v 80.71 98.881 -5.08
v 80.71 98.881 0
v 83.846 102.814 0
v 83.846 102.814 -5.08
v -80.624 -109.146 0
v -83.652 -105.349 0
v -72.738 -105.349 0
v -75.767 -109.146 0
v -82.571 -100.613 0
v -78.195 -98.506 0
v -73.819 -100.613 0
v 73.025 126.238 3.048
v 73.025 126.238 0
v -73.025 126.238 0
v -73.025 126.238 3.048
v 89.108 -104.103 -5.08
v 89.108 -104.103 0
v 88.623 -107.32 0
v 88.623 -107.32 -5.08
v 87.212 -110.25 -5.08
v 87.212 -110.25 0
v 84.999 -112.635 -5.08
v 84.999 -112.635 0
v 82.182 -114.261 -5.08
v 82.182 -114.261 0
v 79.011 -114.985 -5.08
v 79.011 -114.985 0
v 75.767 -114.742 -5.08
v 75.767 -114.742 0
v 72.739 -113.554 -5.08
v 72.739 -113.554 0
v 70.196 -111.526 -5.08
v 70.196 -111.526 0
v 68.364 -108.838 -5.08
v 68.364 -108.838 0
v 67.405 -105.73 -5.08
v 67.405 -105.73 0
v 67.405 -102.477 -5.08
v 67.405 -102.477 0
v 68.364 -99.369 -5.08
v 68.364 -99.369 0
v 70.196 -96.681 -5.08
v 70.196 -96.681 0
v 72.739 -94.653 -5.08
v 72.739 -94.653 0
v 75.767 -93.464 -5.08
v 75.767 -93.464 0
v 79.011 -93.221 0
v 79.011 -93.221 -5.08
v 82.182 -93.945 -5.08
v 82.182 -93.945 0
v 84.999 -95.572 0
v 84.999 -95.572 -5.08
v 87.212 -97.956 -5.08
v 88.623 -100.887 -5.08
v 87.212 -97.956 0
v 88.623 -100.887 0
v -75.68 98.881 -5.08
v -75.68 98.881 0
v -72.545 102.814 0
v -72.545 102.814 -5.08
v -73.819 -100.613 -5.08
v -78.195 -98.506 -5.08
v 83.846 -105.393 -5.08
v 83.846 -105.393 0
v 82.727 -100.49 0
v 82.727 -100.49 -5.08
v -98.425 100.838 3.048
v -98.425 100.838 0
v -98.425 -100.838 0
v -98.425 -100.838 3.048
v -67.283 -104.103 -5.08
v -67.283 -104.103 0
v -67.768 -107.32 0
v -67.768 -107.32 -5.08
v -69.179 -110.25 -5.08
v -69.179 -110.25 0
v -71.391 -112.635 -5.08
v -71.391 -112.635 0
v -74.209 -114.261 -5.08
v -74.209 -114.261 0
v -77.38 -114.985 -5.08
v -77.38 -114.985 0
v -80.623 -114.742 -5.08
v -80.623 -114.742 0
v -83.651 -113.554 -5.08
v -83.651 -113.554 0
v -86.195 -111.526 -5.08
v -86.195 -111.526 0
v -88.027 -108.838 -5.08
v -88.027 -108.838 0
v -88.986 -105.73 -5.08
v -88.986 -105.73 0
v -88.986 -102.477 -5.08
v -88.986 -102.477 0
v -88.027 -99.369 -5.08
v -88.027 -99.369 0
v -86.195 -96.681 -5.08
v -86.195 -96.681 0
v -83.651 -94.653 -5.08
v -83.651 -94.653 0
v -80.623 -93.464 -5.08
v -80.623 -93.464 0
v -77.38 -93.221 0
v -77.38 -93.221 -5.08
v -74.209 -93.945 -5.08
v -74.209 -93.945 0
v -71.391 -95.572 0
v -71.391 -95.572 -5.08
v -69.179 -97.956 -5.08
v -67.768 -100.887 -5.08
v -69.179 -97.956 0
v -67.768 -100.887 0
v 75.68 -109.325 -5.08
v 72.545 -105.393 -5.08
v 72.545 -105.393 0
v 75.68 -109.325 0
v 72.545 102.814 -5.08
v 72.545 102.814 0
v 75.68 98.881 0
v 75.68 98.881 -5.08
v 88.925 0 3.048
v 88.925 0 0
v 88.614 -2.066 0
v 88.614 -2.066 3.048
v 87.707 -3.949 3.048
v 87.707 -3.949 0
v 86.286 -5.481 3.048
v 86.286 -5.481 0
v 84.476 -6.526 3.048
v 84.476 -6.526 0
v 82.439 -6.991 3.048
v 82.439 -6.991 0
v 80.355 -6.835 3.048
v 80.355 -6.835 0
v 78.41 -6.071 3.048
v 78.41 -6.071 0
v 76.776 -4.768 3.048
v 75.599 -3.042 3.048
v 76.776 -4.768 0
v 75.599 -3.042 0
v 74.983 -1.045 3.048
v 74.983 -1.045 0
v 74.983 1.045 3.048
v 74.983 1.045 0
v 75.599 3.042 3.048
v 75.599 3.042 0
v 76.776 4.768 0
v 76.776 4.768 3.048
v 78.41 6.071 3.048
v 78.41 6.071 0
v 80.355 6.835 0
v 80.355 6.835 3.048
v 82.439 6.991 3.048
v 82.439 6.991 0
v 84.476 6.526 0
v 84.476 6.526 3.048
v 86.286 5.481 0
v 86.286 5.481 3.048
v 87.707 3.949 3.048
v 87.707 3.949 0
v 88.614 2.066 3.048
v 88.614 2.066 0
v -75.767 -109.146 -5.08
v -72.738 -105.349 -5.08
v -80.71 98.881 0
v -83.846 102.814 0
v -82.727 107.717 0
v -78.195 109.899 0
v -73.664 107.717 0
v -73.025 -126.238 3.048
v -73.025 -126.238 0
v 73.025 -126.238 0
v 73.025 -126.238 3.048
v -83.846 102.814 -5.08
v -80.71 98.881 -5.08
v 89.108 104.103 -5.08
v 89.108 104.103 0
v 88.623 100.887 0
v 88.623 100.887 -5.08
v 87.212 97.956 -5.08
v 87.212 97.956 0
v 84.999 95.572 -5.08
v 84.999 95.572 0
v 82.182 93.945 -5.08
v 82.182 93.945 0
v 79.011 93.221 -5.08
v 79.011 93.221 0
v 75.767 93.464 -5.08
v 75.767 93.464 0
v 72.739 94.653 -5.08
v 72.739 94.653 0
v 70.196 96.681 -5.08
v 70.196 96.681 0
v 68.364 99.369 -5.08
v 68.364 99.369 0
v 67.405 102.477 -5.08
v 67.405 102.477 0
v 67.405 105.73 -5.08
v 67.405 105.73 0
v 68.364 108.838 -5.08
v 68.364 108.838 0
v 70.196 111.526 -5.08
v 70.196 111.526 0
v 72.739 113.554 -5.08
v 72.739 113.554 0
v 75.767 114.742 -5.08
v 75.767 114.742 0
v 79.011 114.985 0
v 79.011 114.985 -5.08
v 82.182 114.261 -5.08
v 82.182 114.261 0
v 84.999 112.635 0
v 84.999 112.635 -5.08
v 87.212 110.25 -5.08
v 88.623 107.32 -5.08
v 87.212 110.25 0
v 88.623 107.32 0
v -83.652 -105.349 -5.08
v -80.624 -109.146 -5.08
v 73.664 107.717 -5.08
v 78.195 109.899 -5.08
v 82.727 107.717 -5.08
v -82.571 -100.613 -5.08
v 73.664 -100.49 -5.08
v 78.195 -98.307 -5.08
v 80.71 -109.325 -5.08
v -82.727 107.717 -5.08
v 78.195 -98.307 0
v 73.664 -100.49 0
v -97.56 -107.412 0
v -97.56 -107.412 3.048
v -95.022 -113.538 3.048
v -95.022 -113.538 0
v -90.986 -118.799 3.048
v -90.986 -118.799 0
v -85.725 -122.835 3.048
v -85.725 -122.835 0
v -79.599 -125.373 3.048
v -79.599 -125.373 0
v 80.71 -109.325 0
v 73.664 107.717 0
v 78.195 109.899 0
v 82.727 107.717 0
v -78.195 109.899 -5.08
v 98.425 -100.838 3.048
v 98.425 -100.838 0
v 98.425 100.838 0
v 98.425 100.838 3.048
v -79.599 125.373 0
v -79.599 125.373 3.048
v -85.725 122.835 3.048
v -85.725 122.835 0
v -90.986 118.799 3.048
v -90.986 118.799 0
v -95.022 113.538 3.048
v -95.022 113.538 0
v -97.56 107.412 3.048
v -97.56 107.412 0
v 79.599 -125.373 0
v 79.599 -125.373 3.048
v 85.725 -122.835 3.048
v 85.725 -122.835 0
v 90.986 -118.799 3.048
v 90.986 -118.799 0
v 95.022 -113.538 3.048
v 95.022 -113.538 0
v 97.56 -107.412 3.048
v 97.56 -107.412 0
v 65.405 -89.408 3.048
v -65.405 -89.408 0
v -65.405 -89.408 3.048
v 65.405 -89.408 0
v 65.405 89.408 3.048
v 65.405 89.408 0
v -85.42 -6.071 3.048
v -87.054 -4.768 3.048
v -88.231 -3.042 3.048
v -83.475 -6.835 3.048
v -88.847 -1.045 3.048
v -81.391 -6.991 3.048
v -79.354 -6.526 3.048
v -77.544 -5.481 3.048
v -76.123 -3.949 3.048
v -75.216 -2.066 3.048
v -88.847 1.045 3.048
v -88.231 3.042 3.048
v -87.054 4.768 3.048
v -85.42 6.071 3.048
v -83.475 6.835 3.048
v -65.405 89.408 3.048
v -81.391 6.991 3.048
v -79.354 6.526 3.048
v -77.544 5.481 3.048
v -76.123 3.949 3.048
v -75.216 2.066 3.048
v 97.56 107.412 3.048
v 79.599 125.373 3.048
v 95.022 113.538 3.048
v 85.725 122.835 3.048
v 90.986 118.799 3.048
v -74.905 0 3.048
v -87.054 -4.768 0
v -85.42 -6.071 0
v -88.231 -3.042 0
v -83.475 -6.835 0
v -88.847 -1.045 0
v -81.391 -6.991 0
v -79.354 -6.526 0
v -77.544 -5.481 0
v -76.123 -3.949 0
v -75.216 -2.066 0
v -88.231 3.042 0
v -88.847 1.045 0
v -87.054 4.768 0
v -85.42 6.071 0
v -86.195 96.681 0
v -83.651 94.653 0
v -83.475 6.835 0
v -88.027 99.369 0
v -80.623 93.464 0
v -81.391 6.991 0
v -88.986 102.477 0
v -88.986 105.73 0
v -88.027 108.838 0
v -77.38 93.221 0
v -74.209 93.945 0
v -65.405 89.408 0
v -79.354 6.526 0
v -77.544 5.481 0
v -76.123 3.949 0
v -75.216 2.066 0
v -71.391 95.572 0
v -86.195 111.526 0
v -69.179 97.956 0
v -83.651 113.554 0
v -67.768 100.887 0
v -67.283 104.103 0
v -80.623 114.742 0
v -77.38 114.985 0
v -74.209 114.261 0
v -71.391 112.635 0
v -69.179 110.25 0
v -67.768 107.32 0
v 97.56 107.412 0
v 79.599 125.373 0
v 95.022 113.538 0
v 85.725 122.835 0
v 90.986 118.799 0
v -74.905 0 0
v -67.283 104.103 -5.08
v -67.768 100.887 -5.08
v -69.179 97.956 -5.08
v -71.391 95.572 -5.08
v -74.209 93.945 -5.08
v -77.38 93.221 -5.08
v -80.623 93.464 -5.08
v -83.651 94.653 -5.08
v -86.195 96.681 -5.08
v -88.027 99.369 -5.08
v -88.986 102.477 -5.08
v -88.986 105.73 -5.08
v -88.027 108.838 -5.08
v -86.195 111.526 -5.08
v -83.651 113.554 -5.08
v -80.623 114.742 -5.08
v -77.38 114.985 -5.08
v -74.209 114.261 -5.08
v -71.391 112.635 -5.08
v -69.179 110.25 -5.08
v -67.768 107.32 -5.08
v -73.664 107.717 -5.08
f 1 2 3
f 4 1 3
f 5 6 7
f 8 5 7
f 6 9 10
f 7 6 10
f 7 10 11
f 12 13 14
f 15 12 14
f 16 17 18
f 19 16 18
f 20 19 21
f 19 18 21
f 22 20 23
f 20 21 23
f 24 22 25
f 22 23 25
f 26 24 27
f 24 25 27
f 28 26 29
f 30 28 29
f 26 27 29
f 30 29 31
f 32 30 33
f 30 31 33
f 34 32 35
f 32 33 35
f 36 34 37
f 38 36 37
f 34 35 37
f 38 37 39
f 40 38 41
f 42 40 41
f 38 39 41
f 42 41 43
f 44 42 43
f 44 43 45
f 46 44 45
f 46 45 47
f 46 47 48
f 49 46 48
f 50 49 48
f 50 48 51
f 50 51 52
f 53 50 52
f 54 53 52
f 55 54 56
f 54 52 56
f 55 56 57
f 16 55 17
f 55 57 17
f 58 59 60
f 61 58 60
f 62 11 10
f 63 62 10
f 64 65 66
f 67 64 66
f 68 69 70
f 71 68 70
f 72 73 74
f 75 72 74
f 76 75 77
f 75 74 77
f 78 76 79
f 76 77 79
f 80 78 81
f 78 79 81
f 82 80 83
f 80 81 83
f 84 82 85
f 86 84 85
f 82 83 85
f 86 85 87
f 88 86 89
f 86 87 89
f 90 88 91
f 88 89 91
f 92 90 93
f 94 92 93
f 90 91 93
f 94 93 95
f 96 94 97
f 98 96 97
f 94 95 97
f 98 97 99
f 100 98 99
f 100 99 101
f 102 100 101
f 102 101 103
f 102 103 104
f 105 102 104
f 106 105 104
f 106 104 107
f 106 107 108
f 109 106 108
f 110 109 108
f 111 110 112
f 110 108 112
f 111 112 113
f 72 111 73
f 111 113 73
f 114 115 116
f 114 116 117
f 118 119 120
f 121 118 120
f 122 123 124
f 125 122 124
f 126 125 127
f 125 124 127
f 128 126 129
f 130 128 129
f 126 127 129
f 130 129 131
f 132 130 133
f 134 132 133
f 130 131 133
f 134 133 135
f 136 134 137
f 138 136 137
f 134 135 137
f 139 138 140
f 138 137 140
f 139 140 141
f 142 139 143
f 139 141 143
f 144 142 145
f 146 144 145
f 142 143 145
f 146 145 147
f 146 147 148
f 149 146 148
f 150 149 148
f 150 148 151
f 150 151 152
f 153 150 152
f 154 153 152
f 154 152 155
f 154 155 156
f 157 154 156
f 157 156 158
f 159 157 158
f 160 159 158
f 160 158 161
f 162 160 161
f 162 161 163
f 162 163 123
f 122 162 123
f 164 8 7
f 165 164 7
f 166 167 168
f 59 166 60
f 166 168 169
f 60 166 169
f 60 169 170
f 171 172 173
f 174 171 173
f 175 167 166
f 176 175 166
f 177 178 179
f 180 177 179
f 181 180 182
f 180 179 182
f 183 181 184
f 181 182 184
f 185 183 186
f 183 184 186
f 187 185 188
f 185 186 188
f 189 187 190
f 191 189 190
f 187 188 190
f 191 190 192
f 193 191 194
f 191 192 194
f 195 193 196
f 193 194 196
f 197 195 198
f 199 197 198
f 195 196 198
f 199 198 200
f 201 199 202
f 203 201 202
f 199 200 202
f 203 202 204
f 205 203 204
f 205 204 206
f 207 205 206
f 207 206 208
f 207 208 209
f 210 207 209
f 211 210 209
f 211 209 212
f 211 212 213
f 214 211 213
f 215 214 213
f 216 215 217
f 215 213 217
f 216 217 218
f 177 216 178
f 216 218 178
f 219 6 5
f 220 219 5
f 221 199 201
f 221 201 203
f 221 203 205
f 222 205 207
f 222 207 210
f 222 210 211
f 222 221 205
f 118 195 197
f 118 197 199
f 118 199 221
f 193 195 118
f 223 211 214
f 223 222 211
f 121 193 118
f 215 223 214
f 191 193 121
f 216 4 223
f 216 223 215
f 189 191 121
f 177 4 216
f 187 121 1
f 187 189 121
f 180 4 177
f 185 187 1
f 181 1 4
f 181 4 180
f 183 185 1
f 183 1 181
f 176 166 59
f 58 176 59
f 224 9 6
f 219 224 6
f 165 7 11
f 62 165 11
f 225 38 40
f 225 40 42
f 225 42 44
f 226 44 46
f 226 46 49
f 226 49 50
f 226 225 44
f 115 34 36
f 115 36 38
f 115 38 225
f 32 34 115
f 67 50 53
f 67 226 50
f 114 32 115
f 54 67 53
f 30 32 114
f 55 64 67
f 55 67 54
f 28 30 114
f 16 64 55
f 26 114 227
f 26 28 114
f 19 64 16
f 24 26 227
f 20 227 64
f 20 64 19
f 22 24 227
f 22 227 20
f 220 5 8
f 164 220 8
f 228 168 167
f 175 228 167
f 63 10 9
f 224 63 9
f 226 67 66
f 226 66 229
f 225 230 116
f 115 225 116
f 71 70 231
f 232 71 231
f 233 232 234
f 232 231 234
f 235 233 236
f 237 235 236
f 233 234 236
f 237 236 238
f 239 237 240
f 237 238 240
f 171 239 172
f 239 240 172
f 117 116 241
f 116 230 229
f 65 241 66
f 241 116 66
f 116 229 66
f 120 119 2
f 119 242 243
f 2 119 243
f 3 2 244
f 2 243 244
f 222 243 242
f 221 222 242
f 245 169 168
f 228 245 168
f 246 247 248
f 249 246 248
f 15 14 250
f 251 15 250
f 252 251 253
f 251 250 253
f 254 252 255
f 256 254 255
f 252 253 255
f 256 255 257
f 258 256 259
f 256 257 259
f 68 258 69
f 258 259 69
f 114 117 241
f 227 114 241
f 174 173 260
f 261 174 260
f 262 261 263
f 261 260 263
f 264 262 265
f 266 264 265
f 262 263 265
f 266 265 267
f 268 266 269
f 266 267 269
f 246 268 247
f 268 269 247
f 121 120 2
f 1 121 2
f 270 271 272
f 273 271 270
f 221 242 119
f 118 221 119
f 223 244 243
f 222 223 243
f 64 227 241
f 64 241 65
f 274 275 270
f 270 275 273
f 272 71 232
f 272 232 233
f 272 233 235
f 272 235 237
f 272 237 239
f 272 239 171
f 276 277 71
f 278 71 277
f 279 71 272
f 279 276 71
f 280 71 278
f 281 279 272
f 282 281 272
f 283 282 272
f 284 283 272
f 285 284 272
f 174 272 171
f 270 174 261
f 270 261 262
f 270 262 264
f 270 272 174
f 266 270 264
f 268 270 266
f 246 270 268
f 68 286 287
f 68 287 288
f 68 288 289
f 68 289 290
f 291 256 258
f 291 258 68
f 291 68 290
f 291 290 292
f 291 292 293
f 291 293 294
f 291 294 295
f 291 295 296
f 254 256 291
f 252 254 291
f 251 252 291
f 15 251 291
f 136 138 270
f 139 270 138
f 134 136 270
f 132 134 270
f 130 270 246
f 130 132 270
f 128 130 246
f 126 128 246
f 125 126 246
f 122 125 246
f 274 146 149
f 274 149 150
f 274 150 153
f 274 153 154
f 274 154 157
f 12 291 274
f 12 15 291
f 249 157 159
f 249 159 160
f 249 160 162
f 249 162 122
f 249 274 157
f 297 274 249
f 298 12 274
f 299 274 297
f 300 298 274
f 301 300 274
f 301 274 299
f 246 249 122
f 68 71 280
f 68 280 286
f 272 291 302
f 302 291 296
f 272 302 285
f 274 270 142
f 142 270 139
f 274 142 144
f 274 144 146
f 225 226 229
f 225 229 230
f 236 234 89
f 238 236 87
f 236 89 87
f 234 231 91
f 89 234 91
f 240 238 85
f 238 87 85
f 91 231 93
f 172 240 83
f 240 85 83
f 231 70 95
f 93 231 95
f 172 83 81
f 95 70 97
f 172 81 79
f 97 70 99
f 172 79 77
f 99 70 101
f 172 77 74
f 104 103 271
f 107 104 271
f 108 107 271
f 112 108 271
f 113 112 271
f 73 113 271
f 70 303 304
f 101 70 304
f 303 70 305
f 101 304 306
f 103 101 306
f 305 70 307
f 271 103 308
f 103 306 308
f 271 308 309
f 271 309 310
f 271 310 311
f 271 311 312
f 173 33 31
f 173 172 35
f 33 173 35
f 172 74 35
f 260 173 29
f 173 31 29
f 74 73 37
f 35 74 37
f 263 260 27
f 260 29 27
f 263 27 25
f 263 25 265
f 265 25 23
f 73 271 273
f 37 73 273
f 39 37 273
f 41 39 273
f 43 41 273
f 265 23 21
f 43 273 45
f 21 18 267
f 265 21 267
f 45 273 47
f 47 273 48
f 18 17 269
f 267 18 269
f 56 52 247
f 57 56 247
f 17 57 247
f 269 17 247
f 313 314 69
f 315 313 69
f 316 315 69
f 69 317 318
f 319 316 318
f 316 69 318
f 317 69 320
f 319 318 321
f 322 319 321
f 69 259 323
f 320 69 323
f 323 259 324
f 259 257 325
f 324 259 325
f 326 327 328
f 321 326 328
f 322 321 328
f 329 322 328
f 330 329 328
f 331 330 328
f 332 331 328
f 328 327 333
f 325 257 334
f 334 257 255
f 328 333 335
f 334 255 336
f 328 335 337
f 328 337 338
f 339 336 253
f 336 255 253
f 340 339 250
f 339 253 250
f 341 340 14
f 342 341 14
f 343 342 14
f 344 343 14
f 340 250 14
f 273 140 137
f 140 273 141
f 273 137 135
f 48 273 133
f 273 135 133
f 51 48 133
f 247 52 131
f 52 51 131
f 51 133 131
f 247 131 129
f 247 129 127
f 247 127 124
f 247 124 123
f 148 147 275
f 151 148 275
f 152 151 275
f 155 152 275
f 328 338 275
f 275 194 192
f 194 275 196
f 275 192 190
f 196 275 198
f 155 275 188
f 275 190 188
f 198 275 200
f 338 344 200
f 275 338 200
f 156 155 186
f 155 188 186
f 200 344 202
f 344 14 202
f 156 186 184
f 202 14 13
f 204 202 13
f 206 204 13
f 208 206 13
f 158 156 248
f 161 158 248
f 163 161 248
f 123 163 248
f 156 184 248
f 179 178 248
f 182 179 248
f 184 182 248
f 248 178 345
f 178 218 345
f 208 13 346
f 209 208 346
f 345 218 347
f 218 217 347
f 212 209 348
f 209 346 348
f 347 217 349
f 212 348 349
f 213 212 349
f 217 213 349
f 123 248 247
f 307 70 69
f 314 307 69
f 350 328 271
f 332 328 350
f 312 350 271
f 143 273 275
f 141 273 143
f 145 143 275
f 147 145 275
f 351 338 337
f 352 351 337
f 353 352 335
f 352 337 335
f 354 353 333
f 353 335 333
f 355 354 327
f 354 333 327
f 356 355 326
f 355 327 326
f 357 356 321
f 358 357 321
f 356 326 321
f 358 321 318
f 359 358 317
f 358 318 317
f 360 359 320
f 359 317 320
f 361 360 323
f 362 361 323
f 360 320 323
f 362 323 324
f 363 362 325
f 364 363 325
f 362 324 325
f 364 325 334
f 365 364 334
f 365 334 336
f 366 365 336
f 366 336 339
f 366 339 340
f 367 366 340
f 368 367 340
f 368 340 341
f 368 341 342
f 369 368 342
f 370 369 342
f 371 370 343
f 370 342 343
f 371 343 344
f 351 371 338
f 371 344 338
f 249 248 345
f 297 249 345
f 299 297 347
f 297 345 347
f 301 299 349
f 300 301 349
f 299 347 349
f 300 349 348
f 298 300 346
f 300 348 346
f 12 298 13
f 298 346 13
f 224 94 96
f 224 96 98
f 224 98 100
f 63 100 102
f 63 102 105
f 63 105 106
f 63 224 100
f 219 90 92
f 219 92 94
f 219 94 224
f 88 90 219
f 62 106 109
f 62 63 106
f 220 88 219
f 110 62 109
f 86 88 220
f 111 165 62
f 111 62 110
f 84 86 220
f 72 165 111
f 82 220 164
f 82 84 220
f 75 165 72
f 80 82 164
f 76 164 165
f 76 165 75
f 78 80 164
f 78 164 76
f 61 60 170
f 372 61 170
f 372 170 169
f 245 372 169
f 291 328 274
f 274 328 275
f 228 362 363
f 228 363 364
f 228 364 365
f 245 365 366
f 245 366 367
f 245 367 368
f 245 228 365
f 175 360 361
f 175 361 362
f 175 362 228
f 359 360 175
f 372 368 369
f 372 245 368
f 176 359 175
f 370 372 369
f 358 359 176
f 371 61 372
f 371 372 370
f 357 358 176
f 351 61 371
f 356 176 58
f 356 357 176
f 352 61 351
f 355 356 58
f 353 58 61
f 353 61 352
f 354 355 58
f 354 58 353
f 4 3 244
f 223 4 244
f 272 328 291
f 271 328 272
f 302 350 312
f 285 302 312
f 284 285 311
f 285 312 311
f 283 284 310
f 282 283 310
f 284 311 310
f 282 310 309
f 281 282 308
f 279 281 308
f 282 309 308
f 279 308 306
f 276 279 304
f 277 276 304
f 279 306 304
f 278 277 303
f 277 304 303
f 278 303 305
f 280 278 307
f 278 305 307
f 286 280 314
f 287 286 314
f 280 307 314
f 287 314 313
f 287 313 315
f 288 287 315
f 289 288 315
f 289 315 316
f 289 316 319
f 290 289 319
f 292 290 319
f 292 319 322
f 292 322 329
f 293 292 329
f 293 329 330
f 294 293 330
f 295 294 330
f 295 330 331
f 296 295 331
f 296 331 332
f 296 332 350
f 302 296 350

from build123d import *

# Parameters (mm, degrees)
F1_DEPTH = 3.048
F2_W     = 130.81
F2_H     = 178.816
F3_DEPTH = 25.4
F4_R     = 7.0104
F5_DEPTH = 25.4
F6_R     = 10.91242
F7_DEPTH = 5.08


with BuildPart() as f1:
    # F0 (on Top) → F1 (new body)
    with BuildSketch(Plane.XY):
        with BuildLine():
            ThreePointArc((-98.425, -100.838), (-90.985512, -118.798512), (-73.025, -126.238))
            Line((-73.025, -126.238), (73.025, -126.238))
            ThreePointArc((73.025, -126.238), (90.985512, -118.798512), (98.425, -100.838))
            Line((98.425, -100.838), (98.425, 100.838))
            ThreePointArc((98.425, 100.838), (90.985512, 118.798512), (73.025, 126.238))
            Line((73.025, 126.238), (-73.025, 126.238))
            ThreePointArc((-73.025, 126.238), (-90.985512, 118.798512), (-98.425, 100.838))
            Line((-98.425, 100.838), (-98.425, -100.838))
        make_face()
    extrude(amount=F1_DEPTH)

    # F2 (on face) → F3 (cut)
    with BuildSketch(Plane(origin=(0, 0, 0), x_dir=(1, 0, 0), z_dir=(0, 0, -1))):
        Rectangle(F2_W, F2_H)
    extrude(amount=-F3_DEPTH, mode=Mode.SUBTRACT)

    # F4 (on face) → F5 (cut)
    with BuildSketch(Plane(origin=(0, 0, 0), x_dir=(1, 0, 0), z_dir=(0, 0, -1))):
        with Locations((-81.915, 0)):
            Circle(F4_R)
        with Locations((81.915, 0)):
            Circle(F4_R)
    extrude(amount=-F5_DEPTH, mode=Mode.SUBTRACT)

    # F6 (on face) → F7 (join)
    with BuildSketch(Plane(origin=(0, 0, 0), x_dir=(1, 0, 0), z_dir=(0, 0, -1))):
        with Locations((78.195256, 104.103256)):
            Circle(F6_R)
        Polygon((72.54457, 105.392988), (75.680464, 109.325276), (80.710048, 109.325276), (83.845943, 105.392988), (82.726755, 100.489507), (78.195256, 98.307252), (73.663757, 100.489507), align=None, mode=Mode.SUBTRACT)
        with Locations((-78.195256, 104.103256)):
            Circle(F6_R)
        Polygon((-83.652061, 105.348736), (-80.623763, 109.146102), (-75.766749, 109.146102), (-72.738451, 105.348736), (-73.819238, 100.613498), (-78.195256, 98.506119), (-82.571274, 100.613498), align=None, mode=Mode.SUBTRACT)
        with Locations((-78.195256, -104.103256)):
            Circle(F6_R)
        Polygon((-83.845943, -102.813524), (-80.710048, -98.881237), (-75.680464, -98.881237), (-72.54457, -102.813524), (-73.663757, -107.717006), (-78.195256, -109.89926), (-82.726755, -107.717006), align=None, mode=Mode.SUBTRACT)
        with Locations((78.195256, -104.103256)):
            Circle(F6_R)
        Polygon((72.54457, -102.813524), (75.680464, -98.881237), (80.710048, -98.881237), (83.845943, -102.813524), (82.726755, -107.717006), (78.195256, -109.89926), (73.663757, -107.717006), align=None, mode=Mode.SUBTRACT)
    extrude(amount=F7_DEPTH)


solid = f1.part
